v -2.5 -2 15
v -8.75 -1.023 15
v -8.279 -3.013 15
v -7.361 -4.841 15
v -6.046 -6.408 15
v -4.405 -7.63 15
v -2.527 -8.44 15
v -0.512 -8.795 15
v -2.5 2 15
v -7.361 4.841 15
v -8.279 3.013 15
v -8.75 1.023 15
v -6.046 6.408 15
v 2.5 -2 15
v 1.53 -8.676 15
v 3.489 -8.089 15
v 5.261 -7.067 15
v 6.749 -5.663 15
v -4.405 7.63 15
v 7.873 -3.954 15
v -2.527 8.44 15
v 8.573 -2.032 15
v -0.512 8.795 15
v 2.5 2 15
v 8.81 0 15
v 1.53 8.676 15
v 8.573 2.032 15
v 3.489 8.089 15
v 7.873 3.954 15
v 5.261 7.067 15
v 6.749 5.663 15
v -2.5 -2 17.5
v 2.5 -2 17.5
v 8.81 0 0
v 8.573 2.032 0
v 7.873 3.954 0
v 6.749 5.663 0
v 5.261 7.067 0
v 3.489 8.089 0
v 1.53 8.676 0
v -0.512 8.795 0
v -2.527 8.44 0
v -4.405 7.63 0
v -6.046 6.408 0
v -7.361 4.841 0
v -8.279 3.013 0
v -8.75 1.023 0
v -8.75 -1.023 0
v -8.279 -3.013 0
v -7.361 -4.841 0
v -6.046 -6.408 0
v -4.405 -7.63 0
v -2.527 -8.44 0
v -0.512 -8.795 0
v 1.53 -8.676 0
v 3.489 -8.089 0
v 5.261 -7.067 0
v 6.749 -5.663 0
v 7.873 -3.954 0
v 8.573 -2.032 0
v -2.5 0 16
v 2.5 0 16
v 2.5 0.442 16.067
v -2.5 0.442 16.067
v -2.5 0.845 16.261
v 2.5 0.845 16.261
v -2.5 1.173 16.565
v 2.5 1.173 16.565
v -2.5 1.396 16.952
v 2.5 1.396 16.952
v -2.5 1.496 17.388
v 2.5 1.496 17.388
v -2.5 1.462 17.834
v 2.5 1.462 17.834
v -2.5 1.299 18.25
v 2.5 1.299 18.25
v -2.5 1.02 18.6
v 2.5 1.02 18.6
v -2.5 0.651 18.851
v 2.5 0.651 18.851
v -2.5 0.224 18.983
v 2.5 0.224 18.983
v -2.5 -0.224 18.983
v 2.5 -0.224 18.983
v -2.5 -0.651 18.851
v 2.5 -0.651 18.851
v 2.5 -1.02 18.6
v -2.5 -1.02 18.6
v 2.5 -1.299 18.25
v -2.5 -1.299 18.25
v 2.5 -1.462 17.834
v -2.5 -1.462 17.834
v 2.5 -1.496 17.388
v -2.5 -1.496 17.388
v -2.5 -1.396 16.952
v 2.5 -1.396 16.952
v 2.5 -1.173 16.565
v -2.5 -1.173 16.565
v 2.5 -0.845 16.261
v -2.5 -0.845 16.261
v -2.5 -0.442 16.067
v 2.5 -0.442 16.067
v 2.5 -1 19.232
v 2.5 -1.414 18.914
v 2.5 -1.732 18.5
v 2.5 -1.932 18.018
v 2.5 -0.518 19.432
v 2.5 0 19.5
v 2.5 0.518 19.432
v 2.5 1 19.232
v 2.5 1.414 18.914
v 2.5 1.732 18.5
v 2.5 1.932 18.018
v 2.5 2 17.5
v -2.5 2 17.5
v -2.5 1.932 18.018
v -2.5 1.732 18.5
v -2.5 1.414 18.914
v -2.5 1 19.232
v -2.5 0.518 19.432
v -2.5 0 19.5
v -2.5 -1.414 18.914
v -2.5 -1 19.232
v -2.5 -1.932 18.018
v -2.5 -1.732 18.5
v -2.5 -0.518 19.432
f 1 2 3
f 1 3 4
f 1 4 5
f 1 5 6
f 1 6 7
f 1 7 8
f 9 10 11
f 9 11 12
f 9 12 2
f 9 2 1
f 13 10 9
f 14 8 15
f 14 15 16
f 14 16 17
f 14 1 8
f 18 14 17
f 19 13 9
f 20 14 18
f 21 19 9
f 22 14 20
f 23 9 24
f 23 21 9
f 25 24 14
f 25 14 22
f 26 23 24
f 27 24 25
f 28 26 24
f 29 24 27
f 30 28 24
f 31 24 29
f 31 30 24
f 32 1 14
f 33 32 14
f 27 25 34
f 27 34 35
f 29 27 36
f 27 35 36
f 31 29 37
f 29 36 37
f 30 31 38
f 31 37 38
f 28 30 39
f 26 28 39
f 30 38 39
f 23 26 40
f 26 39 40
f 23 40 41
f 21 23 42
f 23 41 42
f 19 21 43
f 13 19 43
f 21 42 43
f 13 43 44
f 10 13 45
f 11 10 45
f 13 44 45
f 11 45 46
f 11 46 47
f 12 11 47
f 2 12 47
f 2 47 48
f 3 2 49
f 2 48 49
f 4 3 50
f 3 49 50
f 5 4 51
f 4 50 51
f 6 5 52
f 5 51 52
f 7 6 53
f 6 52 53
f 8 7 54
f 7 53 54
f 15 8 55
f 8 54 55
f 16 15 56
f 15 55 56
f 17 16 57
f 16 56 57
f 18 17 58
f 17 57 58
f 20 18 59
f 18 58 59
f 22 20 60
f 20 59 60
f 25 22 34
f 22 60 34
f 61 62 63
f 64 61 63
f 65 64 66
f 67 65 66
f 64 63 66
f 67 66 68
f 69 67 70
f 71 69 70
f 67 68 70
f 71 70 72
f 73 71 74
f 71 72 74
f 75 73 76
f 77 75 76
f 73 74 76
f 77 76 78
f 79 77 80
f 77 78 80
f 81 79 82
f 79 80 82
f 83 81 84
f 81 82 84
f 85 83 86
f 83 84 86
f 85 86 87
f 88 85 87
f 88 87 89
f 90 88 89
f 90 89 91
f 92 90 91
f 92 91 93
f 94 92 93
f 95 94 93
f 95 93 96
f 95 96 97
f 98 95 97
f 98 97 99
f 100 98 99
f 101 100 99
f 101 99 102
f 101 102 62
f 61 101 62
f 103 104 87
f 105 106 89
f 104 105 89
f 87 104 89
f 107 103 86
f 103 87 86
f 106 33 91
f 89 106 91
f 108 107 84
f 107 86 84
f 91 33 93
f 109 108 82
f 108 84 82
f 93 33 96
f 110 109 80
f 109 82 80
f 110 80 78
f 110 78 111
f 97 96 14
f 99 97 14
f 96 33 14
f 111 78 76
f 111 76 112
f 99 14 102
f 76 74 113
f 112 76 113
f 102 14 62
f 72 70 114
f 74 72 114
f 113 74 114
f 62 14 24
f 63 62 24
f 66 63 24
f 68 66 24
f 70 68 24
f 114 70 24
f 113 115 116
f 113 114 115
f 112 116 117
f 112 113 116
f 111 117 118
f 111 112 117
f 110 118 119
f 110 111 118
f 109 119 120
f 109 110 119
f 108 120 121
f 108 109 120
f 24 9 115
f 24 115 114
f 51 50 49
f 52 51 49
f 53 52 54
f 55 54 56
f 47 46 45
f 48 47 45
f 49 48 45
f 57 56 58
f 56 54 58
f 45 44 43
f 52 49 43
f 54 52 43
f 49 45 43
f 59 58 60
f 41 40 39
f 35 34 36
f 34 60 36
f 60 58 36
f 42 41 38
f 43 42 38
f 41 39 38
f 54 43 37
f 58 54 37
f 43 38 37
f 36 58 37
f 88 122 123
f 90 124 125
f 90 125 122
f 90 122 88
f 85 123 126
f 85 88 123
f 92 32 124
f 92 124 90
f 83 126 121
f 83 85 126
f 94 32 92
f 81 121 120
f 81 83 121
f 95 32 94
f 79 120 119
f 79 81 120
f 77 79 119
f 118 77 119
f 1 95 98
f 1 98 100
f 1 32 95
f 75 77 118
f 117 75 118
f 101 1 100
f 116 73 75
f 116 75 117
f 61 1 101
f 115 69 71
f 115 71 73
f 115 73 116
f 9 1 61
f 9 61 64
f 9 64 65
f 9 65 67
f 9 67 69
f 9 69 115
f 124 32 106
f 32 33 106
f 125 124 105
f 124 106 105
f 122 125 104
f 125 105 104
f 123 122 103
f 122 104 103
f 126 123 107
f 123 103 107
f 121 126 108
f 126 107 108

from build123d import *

# Parameters (mm, degrees)
SKETCH1_R           = 8.81
BOSS_EXTRUDE1_DEPTH = 15
SKETCH2_W           = 5
SKETCH2_H           = 4
BOSS_EXTRUDE2_DEPTH = 4.5
FILLET7_R           = 2
SKETCH3_R           = 1.5
CUT_EXTRUDE1_DEPTH  = 25.202937838


with BuildPart() as part:
    # Sketch1 → Boss-Extrude1 (new body)
    with BuildSketch(Plane.XY):
        Circle(SKETCH1_R)
    extrude(amount=BOSS_EXTRUDE1_DEPTH)

    # Sketch2 → Boss-Extrude2 (add)
    with BuildSketch(Plane.XY.offset(15)):
        Rectangle(SKETCH2_W, SKETCH2_H)
    extrude(amount=BOSS_EXTRUDE2_DEPTH)

    # Fillet7
    fillet7_edges = [part.edges().sort_by_distance(p)[0] for p in [
        (0, 2, 19.5),
        (0, -2, 19.5),
    ]]
    fillet(fillet7_edges, radius=FILLET7_R - 0.0001)  # a hair under: the kernel refuses the full size

    # Sketch3 → Cut-Extrude1 (cut, through all)
    with BuildSketch(Plane(origin=(2.5, 0, 0), x_dir=(0, 0, -1), z_dir=(1, 0, 0))):
        with Locations((-17.5, 0)):
            Circle(SKETCH3_R)
    extrude(amount=-CUT_EXTRUDE1_DEPTH, mode=Mode.SUBTRACT)


solid = part.part
